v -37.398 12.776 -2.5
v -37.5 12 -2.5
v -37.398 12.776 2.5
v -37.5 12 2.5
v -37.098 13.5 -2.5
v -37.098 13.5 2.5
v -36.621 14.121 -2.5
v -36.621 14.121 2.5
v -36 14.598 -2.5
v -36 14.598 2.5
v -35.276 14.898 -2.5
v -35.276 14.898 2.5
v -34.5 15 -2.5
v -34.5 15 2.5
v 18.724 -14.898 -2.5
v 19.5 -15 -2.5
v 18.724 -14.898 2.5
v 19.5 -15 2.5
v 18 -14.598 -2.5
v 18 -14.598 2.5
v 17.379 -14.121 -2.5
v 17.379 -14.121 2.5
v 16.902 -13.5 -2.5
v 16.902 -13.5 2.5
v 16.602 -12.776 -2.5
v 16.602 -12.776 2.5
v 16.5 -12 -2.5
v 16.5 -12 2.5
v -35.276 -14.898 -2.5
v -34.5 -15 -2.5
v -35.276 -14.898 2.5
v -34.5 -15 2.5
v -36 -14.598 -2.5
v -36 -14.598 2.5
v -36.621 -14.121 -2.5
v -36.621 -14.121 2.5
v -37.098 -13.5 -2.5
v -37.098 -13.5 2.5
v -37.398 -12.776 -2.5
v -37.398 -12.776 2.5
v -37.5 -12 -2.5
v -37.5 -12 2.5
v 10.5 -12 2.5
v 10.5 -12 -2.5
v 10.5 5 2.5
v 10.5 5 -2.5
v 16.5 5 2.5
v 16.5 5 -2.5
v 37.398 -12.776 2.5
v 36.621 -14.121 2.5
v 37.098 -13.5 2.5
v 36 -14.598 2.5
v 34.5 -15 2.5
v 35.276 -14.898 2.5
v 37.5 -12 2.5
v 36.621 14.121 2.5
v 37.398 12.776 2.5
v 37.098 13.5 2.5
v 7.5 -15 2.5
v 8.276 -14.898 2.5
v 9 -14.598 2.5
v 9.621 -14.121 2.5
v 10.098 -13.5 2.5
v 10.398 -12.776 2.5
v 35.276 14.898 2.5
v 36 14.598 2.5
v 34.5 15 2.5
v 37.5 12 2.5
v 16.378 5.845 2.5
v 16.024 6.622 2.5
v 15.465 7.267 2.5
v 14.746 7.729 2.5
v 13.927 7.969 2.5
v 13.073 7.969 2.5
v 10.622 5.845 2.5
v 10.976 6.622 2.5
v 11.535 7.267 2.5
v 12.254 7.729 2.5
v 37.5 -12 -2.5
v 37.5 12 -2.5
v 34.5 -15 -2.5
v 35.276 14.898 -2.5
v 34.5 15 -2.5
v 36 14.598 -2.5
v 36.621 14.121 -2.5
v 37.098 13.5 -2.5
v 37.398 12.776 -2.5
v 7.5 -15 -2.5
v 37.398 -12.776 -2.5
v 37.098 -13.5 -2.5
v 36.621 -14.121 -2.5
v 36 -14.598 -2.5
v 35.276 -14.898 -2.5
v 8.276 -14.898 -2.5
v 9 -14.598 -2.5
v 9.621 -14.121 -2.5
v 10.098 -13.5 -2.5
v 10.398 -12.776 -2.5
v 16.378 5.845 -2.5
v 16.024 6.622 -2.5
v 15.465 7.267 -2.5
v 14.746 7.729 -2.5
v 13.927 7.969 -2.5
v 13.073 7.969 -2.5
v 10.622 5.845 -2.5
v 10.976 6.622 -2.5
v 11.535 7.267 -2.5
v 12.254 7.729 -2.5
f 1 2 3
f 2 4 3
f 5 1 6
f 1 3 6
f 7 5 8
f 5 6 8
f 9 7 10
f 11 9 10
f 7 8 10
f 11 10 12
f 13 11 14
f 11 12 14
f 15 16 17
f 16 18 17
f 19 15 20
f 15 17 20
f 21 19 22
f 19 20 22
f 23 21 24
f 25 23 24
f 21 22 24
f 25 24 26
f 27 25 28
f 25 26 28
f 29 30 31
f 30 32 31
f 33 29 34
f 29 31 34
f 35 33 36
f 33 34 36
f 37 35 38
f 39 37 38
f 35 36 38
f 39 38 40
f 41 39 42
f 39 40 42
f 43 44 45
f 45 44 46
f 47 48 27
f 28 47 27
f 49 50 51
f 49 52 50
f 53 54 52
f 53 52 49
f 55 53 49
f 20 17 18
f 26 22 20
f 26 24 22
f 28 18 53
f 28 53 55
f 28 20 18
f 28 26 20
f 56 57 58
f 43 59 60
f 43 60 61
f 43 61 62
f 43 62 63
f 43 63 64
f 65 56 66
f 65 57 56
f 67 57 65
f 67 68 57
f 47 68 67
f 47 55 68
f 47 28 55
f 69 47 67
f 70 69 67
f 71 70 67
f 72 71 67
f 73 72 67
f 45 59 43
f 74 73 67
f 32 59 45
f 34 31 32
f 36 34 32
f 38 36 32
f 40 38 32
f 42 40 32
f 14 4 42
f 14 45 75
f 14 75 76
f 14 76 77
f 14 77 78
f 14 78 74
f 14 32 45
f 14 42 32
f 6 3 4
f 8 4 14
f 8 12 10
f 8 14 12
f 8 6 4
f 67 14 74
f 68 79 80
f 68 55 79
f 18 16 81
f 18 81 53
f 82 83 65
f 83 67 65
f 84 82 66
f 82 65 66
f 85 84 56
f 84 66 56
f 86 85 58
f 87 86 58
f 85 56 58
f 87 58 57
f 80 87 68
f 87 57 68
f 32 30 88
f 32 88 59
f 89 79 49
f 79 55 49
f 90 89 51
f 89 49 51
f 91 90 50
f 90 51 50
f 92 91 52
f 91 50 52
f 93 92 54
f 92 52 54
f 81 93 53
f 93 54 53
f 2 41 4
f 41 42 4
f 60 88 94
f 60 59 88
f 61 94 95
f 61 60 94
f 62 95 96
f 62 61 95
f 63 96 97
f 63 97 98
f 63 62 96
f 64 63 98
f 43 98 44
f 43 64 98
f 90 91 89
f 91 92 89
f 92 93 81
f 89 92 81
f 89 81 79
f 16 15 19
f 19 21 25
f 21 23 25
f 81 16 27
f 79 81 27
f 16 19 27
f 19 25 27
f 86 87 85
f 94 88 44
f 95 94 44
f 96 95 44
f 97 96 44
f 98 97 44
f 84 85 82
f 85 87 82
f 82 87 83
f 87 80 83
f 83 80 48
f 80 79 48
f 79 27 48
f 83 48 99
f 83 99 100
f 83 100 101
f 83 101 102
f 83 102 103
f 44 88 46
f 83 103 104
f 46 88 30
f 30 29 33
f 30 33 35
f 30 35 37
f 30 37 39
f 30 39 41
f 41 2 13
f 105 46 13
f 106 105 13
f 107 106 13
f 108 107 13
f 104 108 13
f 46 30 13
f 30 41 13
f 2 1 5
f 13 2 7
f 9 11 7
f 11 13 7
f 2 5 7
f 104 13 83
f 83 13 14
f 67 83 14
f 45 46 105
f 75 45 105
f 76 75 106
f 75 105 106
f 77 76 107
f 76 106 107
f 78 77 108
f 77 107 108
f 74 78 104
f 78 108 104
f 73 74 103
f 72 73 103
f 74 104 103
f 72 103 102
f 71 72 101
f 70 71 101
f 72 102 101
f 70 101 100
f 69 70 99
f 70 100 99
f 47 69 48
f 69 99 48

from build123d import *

# Parameters (mm, degrees)
PLAT_W                      = 30
PLAT_H                      = 5
EL_MENT_M_CANO_SOUD_1_DEPTH = 75
ENL_V_MAT_EXTRU_1_DEPTH     = 6
CONG_1_R                    = 3


with BuildPart() as part:
    # plat → Elément mécano-soudé1 (new body)
    with BuildSketch(Plane.YZ.offset(-37.5)):
        Rectangle(PLAT_W, PLAT_H)
    extrude(amount=EL_MENT_M_CANO_SOUD_1_DEPTH)

    # Esquisse2 → Enlèv. mat.-Extru.1 (cut, through all)
    with BuildSketch(Plane(origin=(0, 0, -2.5), x_dir=(-1, 0, 0), z_dir=(0, 0, -1))):
        with BuildLine():
            Line((-16.5, -15), (-10.5, -15))
            Line((-10.5, -15), (-10.5, 5))
            ThreePointArc((-10.5, 5), (-13.5, 8), (-16.5, 5))
            Line((-16.5, 5), (-16.5, -15))
        make_face()
    extrude(amount=-ENL_V_MAT_EXTRU_1_DEPTH, mode=Mode.SUBTRACT)

    # Congé1
    cong_1_edges = [part.edges().sort_by_distance(p)[0] for p in [
        (37.5, 15, 0),
        (16.5, -15, 0),
        (10.5, -15, 0),
        (37.5, -15, 0),
        (-37.5, 15, 0),
        (-37.5, -15, 0),
    ]]
    fillet(cong_1_edges, radius=CONG_1_R)


solid = part.part
